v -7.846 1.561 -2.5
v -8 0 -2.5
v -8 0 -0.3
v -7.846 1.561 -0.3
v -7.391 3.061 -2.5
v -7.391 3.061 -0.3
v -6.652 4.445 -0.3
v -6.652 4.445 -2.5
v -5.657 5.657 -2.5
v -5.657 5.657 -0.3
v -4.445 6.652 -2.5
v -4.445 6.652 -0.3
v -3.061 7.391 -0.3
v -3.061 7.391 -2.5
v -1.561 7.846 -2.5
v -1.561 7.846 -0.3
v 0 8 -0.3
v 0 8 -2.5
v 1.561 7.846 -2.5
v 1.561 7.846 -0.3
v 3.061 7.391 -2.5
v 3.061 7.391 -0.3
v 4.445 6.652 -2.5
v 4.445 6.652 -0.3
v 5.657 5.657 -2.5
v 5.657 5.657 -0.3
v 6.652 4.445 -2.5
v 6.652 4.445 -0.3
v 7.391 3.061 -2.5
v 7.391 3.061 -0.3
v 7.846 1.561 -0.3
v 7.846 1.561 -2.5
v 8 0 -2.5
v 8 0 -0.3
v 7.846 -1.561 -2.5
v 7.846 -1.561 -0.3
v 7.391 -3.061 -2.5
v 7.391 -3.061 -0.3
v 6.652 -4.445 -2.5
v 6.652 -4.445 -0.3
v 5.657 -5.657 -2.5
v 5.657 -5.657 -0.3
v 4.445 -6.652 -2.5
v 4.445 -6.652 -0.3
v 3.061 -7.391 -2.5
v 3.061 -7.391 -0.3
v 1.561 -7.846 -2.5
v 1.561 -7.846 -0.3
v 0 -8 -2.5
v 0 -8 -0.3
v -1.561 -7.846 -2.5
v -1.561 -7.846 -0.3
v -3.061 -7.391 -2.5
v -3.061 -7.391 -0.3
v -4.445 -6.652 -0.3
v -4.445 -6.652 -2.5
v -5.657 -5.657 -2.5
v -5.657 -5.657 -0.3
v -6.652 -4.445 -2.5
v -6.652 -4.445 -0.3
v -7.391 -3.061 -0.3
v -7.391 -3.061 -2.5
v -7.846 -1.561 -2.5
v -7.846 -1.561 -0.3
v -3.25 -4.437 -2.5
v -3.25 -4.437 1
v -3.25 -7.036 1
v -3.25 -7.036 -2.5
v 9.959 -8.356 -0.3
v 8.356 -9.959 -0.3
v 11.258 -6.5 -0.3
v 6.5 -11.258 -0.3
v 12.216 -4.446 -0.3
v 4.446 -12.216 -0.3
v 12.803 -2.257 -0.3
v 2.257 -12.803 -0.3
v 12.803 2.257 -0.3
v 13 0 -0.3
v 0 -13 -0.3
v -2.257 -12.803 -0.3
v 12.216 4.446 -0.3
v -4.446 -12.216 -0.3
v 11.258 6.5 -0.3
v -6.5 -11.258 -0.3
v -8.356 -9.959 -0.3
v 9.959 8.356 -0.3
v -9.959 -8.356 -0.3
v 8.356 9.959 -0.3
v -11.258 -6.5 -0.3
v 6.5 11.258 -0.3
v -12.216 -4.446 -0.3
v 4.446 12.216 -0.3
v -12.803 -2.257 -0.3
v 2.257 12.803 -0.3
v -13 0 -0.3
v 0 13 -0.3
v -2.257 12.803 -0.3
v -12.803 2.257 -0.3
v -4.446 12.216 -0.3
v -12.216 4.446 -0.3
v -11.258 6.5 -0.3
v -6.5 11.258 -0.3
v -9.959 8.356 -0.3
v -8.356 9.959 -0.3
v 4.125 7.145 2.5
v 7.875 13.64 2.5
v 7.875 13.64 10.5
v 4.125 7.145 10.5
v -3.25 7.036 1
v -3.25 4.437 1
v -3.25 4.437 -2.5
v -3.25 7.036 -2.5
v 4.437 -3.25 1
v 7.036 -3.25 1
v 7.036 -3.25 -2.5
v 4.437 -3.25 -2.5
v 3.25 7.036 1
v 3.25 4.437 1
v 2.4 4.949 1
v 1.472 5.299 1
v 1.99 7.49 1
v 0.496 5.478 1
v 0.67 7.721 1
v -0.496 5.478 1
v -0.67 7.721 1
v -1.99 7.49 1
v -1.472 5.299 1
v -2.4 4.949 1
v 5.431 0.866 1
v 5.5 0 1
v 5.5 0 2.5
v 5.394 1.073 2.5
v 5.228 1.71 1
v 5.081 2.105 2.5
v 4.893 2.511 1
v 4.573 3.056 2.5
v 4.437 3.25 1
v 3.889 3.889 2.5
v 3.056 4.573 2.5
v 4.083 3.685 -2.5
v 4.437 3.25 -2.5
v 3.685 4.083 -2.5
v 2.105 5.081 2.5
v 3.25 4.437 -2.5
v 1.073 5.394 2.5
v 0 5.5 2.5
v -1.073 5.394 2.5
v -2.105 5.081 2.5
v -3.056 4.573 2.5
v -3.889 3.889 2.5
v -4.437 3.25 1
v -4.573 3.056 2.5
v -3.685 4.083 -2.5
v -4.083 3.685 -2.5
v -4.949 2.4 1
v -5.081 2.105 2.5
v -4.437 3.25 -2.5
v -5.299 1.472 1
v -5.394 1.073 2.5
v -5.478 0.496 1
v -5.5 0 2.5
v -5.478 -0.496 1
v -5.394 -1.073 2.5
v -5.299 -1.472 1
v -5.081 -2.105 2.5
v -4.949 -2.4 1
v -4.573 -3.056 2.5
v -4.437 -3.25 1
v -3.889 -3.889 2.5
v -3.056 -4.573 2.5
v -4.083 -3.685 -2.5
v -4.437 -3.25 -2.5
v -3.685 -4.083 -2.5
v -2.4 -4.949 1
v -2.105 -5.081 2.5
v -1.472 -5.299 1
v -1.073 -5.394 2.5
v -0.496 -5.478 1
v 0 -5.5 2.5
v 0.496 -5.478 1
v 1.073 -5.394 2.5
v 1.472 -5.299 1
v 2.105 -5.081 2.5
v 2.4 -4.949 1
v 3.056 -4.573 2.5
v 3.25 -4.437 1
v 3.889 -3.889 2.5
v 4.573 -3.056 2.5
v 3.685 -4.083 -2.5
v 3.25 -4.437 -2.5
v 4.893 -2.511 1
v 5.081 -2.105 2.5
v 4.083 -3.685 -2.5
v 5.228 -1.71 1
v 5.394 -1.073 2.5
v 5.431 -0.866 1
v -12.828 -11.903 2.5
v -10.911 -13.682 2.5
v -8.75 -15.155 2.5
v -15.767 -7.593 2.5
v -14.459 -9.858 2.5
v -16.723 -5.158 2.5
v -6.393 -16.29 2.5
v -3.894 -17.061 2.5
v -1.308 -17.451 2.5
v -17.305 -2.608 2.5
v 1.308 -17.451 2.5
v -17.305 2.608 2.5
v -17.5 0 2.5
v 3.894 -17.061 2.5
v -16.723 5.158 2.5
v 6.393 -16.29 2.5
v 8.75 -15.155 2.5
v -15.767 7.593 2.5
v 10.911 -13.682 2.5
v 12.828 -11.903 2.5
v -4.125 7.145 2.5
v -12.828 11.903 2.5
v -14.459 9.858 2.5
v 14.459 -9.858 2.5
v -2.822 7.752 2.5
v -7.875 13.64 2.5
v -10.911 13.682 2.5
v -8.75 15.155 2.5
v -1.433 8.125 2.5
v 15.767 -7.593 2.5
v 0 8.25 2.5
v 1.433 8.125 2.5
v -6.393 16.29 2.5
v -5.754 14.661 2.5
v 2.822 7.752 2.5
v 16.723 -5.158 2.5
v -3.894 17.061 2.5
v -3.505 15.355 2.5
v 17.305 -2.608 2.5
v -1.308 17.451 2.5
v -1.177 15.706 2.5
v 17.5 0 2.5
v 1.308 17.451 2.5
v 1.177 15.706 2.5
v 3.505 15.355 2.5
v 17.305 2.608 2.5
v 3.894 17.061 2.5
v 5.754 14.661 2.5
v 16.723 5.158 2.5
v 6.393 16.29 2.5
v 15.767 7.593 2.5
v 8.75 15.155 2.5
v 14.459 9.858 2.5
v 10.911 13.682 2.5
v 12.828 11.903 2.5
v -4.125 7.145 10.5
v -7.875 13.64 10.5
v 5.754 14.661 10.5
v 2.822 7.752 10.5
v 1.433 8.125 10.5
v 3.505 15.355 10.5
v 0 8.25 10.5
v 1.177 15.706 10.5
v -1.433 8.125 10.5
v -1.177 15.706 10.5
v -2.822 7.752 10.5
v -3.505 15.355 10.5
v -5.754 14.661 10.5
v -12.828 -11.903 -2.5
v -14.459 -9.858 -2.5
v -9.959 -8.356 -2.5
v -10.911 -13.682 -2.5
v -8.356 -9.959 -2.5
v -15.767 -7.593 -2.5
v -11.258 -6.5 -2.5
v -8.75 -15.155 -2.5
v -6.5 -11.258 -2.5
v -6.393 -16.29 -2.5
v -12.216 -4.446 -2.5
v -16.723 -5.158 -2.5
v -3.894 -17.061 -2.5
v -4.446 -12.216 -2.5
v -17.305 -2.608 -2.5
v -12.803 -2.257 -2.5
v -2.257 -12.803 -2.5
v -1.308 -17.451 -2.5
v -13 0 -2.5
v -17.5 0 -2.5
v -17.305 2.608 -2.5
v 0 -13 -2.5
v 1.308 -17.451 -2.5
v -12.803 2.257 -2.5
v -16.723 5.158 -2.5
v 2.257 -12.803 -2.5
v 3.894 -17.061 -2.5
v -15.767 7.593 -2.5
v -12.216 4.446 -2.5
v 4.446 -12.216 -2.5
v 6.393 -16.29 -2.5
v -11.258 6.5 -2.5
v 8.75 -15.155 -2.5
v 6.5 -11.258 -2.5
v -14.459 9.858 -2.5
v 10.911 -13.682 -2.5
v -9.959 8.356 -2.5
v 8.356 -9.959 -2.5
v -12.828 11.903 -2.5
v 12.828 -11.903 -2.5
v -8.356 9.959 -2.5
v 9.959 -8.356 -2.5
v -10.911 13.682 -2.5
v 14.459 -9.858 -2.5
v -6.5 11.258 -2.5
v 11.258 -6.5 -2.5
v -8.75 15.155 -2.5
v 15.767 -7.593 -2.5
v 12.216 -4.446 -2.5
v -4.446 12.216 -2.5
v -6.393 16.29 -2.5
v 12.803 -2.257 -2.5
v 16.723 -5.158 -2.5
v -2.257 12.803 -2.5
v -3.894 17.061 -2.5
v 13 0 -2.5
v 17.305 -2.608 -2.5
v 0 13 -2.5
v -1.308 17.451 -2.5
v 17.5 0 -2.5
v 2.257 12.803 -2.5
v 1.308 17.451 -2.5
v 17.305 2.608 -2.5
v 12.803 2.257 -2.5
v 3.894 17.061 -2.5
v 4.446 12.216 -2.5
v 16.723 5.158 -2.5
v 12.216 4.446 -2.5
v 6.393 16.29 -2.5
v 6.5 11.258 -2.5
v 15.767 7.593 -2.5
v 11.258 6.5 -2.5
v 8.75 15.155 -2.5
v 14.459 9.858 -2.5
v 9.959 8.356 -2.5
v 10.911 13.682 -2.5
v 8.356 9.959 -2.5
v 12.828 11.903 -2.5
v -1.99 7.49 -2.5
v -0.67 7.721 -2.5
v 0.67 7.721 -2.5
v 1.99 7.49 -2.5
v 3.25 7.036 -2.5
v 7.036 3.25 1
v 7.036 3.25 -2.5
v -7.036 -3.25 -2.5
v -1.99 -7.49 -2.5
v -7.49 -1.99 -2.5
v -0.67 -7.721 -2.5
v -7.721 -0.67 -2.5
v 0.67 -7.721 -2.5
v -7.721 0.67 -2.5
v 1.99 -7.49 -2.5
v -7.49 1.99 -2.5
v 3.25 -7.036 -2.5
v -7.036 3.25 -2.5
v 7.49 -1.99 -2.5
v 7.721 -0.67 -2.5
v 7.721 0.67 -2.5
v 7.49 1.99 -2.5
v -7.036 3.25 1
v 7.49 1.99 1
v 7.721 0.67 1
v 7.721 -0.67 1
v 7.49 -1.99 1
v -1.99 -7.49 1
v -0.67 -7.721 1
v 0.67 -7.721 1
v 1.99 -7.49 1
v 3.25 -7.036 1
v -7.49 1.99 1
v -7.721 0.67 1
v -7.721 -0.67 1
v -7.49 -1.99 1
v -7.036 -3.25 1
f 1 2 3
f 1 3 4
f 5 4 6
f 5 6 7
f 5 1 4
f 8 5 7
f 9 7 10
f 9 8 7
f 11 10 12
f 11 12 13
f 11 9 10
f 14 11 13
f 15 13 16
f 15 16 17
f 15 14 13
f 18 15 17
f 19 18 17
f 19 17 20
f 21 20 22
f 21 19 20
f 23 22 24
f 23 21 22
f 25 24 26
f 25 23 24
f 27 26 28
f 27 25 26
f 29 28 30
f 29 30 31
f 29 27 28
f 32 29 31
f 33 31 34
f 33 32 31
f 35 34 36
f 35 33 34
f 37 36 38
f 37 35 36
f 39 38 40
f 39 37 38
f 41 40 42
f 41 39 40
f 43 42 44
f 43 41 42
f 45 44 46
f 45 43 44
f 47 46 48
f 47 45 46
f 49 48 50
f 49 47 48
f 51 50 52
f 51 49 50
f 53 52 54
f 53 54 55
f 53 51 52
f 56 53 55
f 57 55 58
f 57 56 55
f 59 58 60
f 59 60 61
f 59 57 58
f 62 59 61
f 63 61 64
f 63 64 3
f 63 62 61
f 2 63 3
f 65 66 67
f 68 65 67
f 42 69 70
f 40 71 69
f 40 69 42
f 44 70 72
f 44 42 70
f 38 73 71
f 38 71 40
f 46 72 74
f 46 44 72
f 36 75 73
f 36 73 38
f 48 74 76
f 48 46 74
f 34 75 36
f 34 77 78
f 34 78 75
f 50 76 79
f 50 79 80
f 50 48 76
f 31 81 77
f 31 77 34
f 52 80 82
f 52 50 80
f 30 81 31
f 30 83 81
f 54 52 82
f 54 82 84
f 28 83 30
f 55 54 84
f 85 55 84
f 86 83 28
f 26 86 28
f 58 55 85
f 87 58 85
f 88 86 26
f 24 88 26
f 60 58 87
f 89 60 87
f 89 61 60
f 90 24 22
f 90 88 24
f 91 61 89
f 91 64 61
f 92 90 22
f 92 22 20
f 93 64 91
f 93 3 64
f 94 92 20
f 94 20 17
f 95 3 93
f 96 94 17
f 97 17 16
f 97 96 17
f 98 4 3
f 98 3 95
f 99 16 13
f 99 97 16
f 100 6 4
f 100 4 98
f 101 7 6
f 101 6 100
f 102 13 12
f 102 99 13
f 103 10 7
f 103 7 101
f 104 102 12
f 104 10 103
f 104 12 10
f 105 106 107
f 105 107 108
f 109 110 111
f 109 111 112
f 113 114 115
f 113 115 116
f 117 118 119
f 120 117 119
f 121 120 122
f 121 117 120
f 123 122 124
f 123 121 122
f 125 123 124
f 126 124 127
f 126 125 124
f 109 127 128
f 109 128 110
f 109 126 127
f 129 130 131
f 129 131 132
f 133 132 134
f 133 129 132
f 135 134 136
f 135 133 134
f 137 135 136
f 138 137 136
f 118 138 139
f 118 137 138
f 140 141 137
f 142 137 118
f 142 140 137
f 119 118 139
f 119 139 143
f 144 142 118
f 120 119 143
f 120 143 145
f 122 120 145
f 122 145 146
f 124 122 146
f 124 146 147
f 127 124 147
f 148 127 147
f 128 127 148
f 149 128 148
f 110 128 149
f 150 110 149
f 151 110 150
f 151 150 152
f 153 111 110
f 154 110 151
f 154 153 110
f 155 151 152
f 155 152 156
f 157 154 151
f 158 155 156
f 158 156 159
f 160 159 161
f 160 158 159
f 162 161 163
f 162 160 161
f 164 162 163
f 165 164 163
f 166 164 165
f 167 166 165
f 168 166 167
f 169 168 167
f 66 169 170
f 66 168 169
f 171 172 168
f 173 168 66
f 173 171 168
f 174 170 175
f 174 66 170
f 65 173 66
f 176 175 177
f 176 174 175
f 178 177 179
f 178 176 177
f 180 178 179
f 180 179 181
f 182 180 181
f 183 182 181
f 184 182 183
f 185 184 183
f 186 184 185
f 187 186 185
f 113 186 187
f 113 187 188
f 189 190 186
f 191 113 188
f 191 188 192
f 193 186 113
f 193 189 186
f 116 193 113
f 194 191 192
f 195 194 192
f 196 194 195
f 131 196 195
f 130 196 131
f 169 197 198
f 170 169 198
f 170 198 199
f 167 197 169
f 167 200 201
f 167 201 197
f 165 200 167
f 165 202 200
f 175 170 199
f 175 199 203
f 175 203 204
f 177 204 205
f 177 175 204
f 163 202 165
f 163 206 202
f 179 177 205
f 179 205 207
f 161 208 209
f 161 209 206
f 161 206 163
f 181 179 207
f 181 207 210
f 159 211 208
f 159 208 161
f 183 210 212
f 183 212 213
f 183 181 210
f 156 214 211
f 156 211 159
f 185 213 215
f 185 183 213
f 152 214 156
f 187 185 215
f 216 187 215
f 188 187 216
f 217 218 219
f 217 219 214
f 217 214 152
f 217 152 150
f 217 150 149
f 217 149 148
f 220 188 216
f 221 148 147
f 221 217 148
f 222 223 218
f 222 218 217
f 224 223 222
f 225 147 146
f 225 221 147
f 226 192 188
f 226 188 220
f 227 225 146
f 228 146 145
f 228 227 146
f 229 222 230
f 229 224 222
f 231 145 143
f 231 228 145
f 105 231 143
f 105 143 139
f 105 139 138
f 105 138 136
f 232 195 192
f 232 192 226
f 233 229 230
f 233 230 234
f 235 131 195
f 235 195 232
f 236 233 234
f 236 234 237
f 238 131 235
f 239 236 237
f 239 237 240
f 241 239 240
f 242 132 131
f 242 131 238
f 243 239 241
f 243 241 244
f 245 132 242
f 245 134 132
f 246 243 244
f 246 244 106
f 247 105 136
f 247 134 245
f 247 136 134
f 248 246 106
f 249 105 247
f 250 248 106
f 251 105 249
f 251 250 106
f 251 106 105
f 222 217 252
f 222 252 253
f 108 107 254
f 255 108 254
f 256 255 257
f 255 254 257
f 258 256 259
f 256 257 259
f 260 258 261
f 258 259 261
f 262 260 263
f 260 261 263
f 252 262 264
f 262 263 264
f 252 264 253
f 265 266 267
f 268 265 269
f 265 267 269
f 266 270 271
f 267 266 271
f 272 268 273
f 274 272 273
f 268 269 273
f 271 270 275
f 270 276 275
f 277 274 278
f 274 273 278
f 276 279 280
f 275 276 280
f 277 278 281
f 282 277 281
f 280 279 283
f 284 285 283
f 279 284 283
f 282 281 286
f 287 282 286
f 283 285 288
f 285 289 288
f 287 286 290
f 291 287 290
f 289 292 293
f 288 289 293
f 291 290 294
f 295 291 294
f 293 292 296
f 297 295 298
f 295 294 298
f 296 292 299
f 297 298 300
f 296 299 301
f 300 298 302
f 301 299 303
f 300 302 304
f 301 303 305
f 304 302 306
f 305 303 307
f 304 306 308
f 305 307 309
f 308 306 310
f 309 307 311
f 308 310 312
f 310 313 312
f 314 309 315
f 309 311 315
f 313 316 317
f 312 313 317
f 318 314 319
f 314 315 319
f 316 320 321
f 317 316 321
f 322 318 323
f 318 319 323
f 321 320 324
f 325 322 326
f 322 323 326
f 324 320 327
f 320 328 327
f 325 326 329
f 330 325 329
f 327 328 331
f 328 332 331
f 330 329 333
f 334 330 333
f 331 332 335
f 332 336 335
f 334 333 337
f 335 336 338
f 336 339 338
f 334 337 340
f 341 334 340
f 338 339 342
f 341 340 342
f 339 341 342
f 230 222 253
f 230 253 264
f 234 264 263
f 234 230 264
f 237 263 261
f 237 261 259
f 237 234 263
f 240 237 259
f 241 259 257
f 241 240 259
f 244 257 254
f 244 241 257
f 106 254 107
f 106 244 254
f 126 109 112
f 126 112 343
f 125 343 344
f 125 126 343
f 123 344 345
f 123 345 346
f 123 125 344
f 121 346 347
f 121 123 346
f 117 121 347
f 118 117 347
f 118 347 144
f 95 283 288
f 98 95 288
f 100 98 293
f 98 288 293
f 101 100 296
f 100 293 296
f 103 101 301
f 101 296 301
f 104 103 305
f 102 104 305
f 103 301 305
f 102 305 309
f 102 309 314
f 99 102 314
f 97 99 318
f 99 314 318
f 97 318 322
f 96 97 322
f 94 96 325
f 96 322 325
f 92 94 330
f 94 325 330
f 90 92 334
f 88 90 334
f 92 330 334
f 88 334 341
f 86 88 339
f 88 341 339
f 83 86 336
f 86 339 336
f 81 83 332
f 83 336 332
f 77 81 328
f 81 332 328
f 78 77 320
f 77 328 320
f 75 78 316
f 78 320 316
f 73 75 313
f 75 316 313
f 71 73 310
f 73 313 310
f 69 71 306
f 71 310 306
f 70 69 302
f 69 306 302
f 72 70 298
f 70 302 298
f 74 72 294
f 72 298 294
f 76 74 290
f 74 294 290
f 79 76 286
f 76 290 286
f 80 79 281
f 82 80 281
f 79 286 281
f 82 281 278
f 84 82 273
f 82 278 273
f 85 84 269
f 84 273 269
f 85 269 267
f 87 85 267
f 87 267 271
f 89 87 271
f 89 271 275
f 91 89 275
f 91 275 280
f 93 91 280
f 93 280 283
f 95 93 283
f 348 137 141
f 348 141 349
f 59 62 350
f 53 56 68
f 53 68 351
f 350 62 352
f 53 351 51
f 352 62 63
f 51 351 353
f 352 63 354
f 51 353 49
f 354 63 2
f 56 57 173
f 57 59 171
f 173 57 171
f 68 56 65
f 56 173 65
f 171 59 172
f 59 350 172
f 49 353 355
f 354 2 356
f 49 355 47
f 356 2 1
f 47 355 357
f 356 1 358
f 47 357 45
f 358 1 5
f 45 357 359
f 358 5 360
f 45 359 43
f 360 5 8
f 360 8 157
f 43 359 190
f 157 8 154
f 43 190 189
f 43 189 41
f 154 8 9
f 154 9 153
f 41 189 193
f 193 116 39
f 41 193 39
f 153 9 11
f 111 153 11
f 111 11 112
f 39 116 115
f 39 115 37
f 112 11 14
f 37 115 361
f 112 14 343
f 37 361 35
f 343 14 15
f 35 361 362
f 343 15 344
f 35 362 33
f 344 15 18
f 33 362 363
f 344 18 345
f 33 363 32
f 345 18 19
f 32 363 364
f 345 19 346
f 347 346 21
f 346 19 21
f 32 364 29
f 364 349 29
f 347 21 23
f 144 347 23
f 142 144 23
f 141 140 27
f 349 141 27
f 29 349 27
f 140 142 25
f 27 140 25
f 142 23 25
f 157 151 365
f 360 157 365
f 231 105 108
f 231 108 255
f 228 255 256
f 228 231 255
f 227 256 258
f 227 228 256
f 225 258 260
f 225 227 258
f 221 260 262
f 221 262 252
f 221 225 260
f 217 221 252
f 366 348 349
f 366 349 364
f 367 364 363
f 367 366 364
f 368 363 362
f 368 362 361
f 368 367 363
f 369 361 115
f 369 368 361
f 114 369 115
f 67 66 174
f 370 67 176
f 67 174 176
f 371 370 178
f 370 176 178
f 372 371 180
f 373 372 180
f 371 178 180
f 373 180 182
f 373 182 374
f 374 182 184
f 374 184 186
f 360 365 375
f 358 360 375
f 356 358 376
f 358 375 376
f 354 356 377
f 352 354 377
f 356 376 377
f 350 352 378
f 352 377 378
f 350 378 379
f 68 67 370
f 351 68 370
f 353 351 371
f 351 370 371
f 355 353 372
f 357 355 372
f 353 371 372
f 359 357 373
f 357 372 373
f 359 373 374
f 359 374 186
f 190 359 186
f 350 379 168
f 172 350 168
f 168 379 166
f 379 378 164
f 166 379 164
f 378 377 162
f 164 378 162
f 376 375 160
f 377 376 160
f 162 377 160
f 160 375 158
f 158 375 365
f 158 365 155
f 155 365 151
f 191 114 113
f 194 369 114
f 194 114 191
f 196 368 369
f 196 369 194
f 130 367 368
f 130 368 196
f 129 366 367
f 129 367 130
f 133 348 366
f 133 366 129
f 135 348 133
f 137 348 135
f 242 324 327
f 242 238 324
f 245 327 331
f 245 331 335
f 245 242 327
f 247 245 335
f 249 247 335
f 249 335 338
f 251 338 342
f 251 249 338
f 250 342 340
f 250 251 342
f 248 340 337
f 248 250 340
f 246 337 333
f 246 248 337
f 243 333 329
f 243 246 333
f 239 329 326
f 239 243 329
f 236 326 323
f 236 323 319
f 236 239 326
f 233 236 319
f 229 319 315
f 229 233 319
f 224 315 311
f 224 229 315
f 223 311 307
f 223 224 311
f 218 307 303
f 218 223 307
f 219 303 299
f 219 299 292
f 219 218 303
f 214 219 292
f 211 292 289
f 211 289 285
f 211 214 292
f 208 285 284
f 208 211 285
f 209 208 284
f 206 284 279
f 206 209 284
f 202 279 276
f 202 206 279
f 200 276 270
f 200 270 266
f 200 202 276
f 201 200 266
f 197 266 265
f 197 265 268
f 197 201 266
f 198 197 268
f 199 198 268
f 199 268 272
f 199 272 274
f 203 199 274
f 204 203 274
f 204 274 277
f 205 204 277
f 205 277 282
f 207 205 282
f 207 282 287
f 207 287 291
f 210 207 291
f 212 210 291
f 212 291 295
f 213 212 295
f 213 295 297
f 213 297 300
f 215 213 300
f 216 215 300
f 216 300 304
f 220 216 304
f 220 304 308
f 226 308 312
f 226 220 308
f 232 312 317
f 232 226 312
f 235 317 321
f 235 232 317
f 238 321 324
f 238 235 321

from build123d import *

# Parameters (mm, degrees)
SKETCH1_R               = 17.5
BOSS_EXTRUDE1_DEPTH     = 2.5
BOSS_EXTRUDE2_DEPTH     = 8
CUT_EXTRUDE1_DEPTH      = 27.009613607
CUT_EXTRUDE1_DEPTH_BACK = 27.009613607
SKETCH3_R               = 5.5
CUT_EXTRUDE4_START      = -3.5
CUT_EXTRUDE4_DEPTH      = 3.5
SKETCH5_R               = 13
SKETCH5_R_2             = 8
CUT_EXTRUDE5_DEPTH      = 2.2


with BuildPart() as part:
    # Sketch1 → Boss-Extrude1 (new, symmetric)
    with BuildSketch(Plane.XY):
        Circle(SKETCH1_R)
    extrude(amount=BOSS_EXTRUDE1_DEPTH, both=True)

    # Sketch2 → Boss-Extrude2 (add)
    with BuildSketch(Plane.XY.offset(2.5)):
        with BuildLine():
            Line((7.875, 13.63990011), (4.125, 7.144709581))
            ThreePointArc((4.125, 7.144709581), (0, 8.25), (-4.125, 7.144709581))
            Line((-4.125, 7.144709581), (-7.875, 13.63990011))
            ThreePointArc((-7.875, 13.63990011), (0, 15.75), (7.875, 13.63990011))
        make_face()
    extrude(amount=BOSS_EXTRUDE2_DEPTH)

    # Sketch3 → Cut-Extrude1 (cut, two sides: drawn at the far end of the back side and taken through both)
    with BuildSketch(Plane.XY.offset(2.5).offset(-CUT_EXTRUDE1_DEPTH_BACK)):
        Circle(SKETCH3_R)
    extrude(amount=CUT_EXTRUDE1_DEPTH + CUT_EXTRUDE1_DEPTH_BACK, mode=Mode.SUBTRACT)

    # Sketch4 → Cut-Extrude4 (cut)
    with BuildSketch(Plane(origin=(0, 0, -2.5), x_dir=(-1, 0, 0), z_dir=(0, 0, -1)).offset(CUT_EXTRUDE4_START)):
        with BuildLine():
            Line((-3.25, 7.03562364), (-3.25, 4.437059837))
            ThreePointArc((-3.25, 4.437059837), (0, 5.5), (3.25, 4.437059837))
            Line((3.25, 4.437059837), (3.25, 7.03562364))
            ThreePointArc((3.25, 7.03562364), (0, 7.75), (-3.25, 7.03562364))
        make_face()
        with BuildLine():
            Line((3.25, -4.437059837), (3.25, -7.03562364))
            ThreePointArc((3.25, -7.03562364), (0, -7.75), (-3.25, -7.03562364))
            Line((-3.25, -7.03562364), (-3.25, -4.437059837))
            ThreePointArc((-3.25, -4.437059837), (0, -5.5), (3.25, -4.437059837))
        make_face()
        with BuildLine():
            Line((-4.437059837, 3.25), (-7.03562364, 3.25))
            ThreePointArc((-7.03562364, 3.25), (-7.75, 0), (-7.03562364, -3.25))
            Line((-7.03562364, -3.25), (-4.437059837, -3.25))
            ThreePointArc((-4.437059837, -3.25), (-5.5, 0), (-4.437059837, 3.25))
        make_face()
        with BuildLine():
            Line((7.03562364, -3.25), (4.437059837, -3.25))
            ThreePointArc((4.437059837, -3.25), (5.5, 0), (4.437059837, 3.25))
            Line((4.437059837, 3.25), (7.03562364, 3.25))
            ThreePointArc((7.03562364, 3.25), (7.75, 0), (7.03562364, -3.25))
        make_face()
    extrude(amount=CUT_EXTRUDE4_DEPTH, mode=Mode.SUBTRACT)

    # Sketch5 → Cut-Extrude5 (cut)
    with BuildSketch(Plane(origin=(0, 0, -2.5), x_dir=(-1, 0, 0), z_dir=(0, 0, -1))):
        Circle(SKETCH5_R)
        Circle(SKETCH5_R_2, mode=Mode.SUBTRACT)
    extrude(amount=-CUT_EXTRUDE5_DEPTH, mode=Mode.SUBTRACT)


solid = part.part
